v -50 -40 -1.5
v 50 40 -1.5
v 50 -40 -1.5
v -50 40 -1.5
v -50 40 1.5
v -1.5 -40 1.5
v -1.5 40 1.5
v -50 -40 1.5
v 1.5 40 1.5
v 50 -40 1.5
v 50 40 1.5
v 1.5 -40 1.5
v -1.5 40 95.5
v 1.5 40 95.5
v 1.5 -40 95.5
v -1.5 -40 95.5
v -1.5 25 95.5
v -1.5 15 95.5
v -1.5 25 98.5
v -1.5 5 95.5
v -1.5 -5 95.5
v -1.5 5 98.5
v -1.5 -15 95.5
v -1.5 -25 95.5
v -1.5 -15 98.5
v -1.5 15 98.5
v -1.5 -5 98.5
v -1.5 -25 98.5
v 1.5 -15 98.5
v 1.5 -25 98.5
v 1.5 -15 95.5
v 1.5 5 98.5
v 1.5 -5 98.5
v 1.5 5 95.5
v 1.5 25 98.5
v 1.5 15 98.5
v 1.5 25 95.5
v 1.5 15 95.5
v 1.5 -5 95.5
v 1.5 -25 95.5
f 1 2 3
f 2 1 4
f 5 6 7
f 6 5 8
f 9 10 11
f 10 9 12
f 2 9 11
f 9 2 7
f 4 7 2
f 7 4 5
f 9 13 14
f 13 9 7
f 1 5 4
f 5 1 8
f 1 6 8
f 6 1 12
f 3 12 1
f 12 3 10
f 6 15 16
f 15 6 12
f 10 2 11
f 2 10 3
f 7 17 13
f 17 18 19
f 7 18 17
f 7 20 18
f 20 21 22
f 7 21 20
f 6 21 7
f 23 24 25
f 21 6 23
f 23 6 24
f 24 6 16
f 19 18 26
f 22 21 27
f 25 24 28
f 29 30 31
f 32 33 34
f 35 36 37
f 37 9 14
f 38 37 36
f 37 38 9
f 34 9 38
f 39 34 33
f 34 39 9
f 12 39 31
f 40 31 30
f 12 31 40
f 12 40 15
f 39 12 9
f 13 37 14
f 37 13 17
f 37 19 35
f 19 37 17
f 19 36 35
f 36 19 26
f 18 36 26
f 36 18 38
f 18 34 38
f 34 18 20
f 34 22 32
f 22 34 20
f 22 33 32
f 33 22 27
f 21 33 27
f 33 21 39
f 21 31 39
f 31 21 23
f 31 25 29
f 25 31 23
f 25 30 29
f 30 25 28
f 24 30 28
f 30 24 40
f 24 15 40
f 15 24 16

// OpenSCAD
/*
  cut finger joints at edge of 2D shape and matching holes inside 2D shapes
*/


module edgeCut(finger = 5, material = 3, numFingers = 4, edgeLen = 100, center = true) {

  fingerSpan = (numFingers*2-1)*finger;
  edgeCut = (edgeLen - fingerSpan)/2;
  echo (fingerSpan, edgeCut);

  // remember to add the edge cut into the center calculation
  trans = center == true ? 
    [-edgeLen/2, -material/2, 0] : [0, 0, 0];

  translate(trans)
  union() {  // treat this as one object to make translation easier
    
    square([edgeCut, material]); // first cut

    //fingers
    for (i = [0:numFingers-2]) {
      translate([edgeCut+finger+i*finger*2, 0, 0])
        square([finger, material]);
    }

    translate([edgeCut+fingerSpan, 0, 0])
      square([edgeCut, material]); // last cut
  }
  
}


module holeCut(finger = 5, material = 3, numFingers = 4, edgeLen = 100, center = true) {

  trans = center == true ? 
    [-(numFingers*2-1)/2*finger, -material/2, 0] : [0, 0, 0];

  translate(trans)
  for (i = [0:numFingers-1]) {
    translate([i*finger*2, 0, 0])
      square([finger, material]);
  }
  
}

module edgeDemo() {
  board = [100, 80];
  material = 3;

  difference() {
    square(board, center = true);
    for (i = [-1, 1]) {
      rotate([0, 0, -90])
      translate([0, i*(board[0]/2-material/2), 0])
        edgeCut(edgeLen = 80, center = true, material = material, 
                numFingers = 3, finger = 10);
    }
  }
}

module holeDemo() {
  board = [100, 80];
  material = 3;

  difference() {
    square(board, center = true);
    rotate([0, 0, -90])
      holeCut(edgeLen = 100, center = true, material = material,
              numFingers = 3, finger = 10);
  }
}

module demo3D() {
  material = 3;

  color("blue")
    linear_extrude(height = 3, center = true)
    holeDemo();

  translate([0, 0, 100/2-material/2])
  rotate([0, 90, 0])
    color("yellow")
    linear_extrude(height = 3, center = true)
    edgeDemo();
}

//edgeDemo();
//holeDemo();
//edgeCut(numFingers = 4, center = false);
//holeCut(numFingers = 4, center = false);
demo3D();
